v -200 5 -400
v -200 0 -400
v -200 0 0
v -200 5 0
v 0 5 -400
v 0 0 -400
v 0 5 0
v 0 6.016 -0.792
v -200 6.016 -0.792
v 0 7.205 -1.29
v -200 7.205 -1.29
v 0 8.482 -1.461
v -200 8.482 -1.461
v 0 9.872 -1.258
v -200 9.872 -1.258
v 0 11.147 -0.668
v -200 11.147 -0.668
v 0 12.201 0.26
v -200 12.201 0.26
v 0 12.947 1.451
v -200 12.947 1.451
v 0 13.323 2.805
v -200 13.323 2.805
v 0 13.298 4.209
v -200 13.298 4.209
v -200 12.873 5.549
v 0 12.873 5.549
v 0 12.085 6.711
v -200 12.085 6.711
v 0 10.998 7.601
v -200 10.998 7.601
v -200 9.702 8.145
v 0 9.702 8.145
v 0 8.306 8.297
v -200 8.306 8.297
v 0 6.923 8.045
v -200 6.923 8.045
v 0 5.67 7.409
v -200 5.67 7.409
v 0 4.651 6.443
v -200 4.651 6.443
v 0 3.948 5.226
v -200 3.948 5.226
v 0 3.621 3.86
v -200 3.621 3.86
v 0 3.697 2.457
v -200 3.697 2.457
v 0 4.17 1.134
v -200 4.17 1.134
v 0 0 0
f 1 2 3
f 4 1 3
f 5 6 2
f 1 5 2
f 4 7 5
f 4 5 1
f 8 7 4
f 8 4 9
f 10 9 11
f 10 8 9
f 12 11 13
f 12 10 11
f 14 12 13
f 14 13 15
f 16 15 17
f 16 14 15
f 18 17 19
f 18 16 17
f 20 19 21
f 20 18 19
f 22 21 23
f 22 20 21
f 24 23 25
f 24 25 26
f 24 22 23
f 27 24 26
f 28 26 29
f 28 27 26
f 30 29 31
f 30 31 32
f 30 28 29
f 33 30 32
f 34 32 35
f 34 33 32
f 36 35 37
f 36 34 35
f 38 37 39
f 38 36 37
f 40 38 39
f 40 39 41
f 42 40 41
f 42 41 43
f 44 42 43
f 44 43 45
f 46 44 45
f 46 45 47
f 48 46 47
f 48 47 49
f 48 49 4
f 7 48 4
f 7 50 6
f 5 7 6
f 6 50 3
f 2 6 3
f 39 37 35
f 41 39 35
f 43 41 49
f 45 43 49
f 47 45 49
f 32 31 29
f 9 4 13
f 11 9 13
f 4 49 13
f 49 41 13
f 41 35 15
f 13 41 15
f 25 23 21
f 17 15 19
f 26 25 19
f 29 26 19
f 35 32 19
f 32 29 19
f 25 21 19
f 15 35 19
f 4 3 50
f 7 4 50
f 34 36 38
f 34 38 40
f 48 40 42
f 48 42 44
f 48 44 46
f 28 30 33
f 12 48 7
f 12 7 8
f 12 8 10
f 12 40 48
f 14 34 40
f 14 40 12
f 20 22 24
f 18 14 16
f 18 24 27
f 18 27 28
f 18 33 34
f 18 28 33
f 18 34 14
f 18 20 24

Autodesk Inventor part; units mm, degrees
ref_plane "YZ Plane" through (0, 0, 0) normal (1, 0, 0) x (0, 1, 0)
ref_plane "XZ Plane" through (0, 0, 0) normal (0, 1, 0) x (-1, 0, 0)
ref_plane "XY Plane" through (0, 0, 0) normal (0, 0, 1) x (1, 0, 0)
sketch "Esboço1" plane through (0, 0, 0) normal (0, 1, 0) x (-1, 0, 0)
  point P0 (0, 0)
sketch "Esboço2" plane through (0, 0, 0) normal (0, 1, 0) x (-1, 0, 0)
  line L0 (0, 0) -> (0, -400)
  line L1 (0, -400) -> (200, -400)
  line L2 (200, -400) -> (200, 0)
  line L3 (200, 0) -> (0, 0)
  dimension "d0" = 400
  dimension "d1" = 200
extrude "Extrusão1" add sketch "Esboço2" along normal blind 5
sketch "Esboço3" plane through (0, 0, 0) normal (1, 0, 0) x (0, 0, -1)
  line L0 (0, 5) -> (400, 5) projected
  circle A0 centre (-3.4197, 8.4818) radius 4.8803
  point P0 (0, 0)
extrude "Extrusão2" add sketch "Esboço3" against normal blind 200
properties part number "base base"
